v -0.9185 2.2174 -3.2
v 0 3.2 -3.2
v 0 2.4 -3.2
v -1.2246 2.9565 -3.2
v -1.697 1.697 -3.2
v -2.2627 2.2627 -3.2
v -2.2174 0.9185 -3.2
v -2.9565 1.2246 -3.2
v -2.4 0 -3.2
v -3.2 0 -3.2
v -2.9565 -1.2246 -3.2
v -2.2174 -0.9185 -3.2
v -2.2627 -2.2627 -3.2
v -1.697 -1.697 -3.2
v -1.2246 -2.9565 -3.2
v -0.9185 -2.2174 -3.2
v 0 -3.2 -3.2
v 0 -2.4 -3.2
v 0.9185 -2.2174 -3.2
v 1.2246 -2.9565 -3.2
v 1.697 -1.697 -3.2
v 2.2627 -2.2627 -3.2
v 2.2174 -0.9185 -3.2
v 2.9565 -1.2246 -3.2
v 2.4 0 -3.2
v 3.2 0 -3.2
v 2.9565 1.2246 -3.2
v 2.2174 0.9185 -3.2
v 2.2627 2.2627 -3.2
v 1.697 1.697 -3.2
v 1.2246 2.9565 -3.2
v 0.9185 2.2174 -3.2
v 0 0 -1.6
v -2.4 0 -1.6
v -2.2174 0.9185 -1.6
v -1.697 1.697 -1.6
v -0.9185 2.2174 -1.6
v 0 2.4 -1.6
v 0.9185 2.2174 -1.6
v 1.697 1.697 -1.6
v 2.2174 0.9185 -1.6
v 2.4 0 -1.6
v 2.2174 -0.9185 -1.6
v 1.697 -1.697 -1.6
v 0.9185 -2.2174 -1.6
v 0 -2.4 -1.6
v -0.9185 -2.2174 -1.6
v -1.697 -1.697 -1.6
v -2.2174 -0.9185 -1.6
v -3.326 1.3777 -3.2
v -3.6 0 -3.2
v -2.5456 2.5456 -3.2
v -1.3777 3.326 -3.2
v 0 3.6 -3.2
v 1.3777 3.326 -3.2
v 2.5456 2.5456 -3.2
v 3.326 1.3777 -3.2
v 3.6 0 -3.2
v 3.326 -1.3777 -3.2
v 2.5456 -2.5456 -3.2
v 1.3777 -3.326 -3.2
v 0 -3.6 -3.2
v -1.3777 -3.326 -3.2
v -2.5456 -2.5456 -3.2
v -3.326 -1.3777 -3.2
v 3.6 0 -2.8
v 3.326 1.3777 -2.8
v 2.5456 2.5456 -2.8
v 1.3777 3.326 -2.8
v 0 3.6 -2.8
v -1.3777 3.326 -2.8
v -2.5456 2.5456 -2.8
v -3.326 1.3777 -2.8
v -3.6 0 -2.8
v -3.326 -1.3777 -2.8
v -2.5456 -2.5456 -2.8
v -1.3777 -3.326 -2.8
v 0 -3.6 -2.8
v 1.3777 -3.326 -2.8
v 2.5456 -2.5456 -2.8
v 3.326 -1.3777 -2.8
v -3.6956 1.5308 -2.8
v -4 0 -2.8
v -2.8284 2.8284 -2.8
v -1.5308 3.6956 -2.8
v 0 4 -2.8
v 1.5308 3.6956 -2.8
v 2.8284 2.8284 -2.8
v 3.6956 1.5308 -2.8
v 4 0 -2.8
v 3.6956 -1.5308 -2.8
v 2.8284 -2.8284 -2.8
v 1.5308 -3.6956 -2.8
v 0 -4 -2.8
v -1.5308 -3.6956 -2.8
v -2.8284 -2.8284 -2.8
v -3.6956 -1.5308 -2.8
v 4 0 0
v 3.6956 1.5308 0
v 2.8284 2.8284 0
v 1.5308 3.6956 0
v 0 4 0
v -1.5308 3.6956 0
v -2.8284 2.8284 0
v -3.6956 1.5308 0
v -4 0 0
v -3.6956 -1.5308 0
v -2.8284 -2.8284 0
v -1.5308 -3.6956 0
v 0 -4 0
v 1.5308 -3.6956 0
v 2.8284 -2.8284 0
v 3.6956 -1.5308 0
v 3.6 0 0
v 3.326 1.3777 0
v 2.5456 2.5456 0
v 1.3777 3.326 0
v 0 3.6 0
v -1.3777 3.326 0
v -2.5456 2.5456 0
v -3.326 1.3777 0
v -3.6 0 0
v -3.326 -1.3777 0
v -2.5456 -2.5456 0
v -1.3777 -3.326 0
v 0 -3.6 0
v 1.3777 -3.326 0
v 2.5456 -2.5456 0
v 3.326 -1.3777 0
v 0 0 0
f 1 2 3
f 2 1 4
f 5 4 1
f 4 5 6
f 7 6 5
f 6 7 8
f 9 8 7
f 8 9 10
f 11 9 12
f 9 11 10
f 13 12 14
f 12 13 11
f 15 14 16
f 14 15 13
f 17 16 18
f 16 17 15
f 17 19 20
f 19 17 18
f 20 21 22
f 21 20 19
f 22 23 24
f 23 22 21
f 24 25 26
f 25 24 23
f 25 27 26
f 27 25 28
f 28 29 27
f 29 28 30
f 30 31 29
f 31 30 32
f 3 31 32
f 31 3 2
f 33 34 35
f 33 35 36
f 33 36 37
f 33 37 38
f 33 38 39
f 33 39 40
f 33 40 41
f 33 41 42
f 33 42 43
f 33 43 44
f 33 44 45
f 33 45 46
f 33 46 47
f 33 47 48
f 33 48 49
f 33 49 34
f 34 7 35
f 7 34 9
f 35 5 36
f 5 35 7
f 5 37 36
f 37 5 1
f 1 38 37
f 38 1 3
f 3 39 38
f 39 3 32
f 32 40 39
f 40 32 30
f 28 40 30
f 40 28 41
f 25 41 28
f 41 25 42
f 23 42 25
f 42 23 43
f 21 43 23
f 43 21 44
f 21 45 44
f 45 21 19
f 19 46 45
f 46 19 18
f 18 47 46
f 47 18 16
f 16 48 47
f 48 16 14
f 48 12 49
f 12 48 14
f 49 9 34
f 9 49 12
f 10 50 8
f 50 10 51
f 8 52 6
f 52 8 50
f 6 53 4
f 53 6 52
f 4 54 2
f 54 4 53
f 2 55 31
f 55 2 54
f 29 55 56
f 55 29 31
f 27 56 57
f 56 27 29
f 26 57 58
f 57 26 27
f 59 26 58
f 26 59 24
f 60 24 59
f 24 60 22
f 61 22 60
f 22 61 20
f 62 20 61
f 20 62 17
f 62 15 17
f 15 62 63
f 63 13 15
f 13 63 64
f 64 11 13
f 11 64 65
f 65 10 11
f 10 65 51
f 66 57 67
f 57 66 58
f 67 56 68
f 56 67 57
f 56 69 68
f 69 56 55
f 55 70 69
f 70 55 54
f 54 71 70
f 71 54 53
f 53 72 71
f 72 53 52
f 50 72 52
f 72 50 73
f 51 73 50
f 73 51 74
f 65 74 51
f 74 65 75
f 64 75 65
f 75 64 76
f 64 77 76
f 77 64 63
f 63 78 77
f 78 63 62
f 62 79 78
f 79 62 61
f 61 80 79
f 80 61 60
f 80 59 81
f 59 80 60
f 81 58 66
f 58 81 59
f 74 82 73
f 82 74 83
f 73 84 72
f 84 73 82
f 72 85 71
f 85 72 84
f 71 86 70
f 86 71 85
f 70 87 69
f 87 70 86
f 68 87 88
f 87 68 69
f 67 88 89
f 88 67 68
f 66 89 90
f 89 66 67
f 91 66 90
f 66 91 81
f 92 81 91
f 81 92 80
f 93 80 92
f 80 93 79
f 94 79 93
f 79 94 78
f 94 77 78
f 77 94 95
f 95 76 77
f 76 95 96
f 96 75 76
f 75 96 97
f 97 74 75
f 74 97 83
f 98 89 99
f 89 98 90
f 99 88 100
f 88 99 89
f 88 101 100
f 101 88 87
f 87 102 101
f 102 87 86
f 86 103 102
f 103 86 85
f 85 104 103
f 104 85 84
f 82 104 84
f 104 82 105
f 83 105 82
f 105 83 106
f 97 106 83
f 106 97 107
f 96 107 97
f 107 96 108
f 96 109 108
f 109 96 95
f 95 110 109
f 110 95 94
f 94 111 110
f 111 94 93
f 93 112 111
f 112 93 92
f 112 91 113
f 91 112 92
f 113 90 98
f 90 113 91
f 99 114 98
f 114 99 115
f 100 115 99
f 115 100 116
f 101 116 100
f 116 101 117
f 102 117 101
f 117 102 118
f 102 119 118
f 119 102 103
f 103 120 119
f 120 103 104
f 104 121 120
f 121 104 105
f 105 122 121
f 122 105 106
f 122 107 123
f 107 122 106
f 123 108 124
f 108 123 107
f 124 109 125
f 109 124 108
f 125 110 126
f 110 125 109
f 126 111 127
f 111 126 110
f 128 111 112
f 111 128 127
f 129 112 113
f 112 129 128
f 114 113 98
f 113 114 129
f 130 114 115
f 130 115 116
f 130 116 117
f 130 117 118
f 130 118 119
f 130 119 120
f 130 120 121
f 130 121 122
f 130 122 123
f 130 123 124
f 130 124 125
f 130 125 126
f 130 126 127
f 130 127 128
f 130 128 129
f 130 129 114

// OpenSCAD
// file: ../p/4-4ring3.scad
use <../lib.scad>
function ldraw_lib__4_4ring3() = [
// 0 Ring  3 x 1.0
// 0 Name: 4-4ring3.dat
// 0 Author: James Jessiman
// 0 !LDRAW_ORG Primitive UPDATE 2009-01
// 0 !LICENSE Licensed under CC BY 4.0 : see CAreadme.txt
// 
// 0 BFC CERTIFY CCW
  [0,"BFC","CERTIFY"],
  [0,"BFC","CCW"],
// 
// 0 !HISTORY 1998-12-15 [PTadmin] Official Update 1998-10
// 0 !HISTORY 2002-04-05 [hafhead] Added BFC statement
// 0 !HISTORY 2002-04-25 [PTadmin] Official Update 2002-02
// 0 !HISTORY 2007-06-24 [PTadmin] Header formatted for Contributor Agreement
// 0 !HISTORY 2008-07-01 [PTadmin] Official Update 2008-01
// 0 !HISTORY 2008-08-26 [cwdee] Switch polygon winding and rename
// 0 !HISTORY 2009-05-02 [PTadmin] Official Update 2009-01
// 
// 
// 4 16 -1.5308 0 3.6956 -1.1481 0 2.7717 0 0 3 0 0 4
  [4,16,-1.5308,0,3.6956,-1.1481,0,2.7717,0,0,3,0,0,4],
// 4 16 -2.8284 0 2.8284 -2.1213 0 2.1213 -1.1481 0 2.7717 -1.5308 0 3.6956
  [4,16,-2.8284,0,2.8284,-2.1213,0,2.1213,-1.1481,0,2.7717,-1.5308,0,3.6956],
// 4 16 -3.6956 0 1.5308 -2.7717 0 1.1481 -2.1213 0 2.1213 -2.8284 0 2.8284
  [4,16,-3.6956,0,1.5308,-2.7717,0,1.1481,-2.1213,0,2.1213,-2.8284,0,2.8284],
// 4 16 -4 0 0 -3 0 0 -2.7717 0 1.1481 -3.6956 0 1.5308
  [4,16,-4,0,0,-3,0,0,-2.7717,0,1.1481,-3.6956,0,1.5308],
// 4 16 -3.6956 0 -1.5308 -2.7717 0 -1.1481 -3 0 0 -4 0 0
  [4,16,-3.6956,0,-1.5308,-2.7717,0,-1.1481,-3,0,0,-4,0,0],
// 4 16 -2.8284 0 -2.8284 -2.1213 0 -2.1213 -2.7717 0 -1.1481 -3.6956 0 -1.5308
  [4,16,-2.8284,0,-2.8284,-2.1213,0,-2.1213,-2.7717,0,-1.1481,-3.6956,0,-1.5308],
// 4 16 -1.5308 0 -3.6956 -1.1481 0 -2.7717 -2.1213 0 -2.1213 -2.8284 0 -2.8284
  [4,16,-1.5308,0,-3.6956,-1.1481,0,-2.7717,-2.1213,0,-2.1213,-2.8284,0,-2.8284],
// 4 16 0 0 -4 0 0 -3 -1.1481 0 -2.7717 -1.5308 0 -3.6956
  [4,16,0,0,-4,0,0,-3,-1.1481,0,-2.7717,-1.5308,0,-3.6956],
// 4 16 1.5308 0 -3.6956 1.1481 0 -2.7717 0 0 -3 0 0 -4
  [4,16,1.5308,0,-3.6956,1.1481,0,-2.7717,0,0,-3,0,0,-4],
// 4 16 2.8284 0 -2.8284 2.1213 0 -2.1213 1.1481 0 -2.7717 1.5308 0 -3.6956
  [4,16,2.8284,0,-2.8284,2.1213,0,-2.1213,1.1481,0,-2.7717,1.5308,0,-3.6956],
// 4 16 3.6956 0 -1.5308 2.7717 0 -1.1481 2.1213 0 -2.1213 2.8284 0 -2.8284
  [4,16,3.6956,0,-1.5308,2.7717,0,-1.1481,2.1213,0,-2.1213,2.8284,0,-2.8284],
// 4 16 4 0 0 3 0 0 2.7717 0 -1.1481 3.6956 0 -1.5308
  [4,16,4,0,0,3,0,0,2.7717,0,-1.1481,3.6956,0,-1.5308],
// 4 16 3.6956 0 1.5308 2.7717 0 1.1481 3 0 0 4 0 0
  [4,16,3.6956,0,1.5308,2.7717,0,1.1481,3,0,0,4,0,0],
// 4 16 2.8284 0 2.8284 2.1213 0 2.1213 2.7717 0 1.1481 3.6956 0 1.5308
  [4,16,2.8284,0,2.8284,2.1213,0,2.1213,2.7717,0,1.1481,3.6956,0,1.5308],
// 4 16 1.5308 0 3.6956 1.1481 0 2.7717 2.1213 0 2.1213 2.8284 0 2.8284
  [4,16,1.5308,0,3.6956,1.1481,0,2.7717,2.1213,0,2.1213,2.8284,0,2.8284],
// 4 16 0 0 4 0 0 3 1.1481 0 2.7717 1.5308 0 3.6956
  [4,16,0,0,4,0,0,3,1.1481,0,2.7717,1.5308,0,3.6956],
// 0
];
module ldraw_lib__4_4ring3(step=0, col=false, unit=2/5, alt=false, line=0.2, solid=!$preview)
    makepoly(ldraw_lib__4_4ring3(), step=step, col=col, unit=unit, alt=alt, line=line, solid=solid);
ldraw_lib__4_4ring3(line=0.2);
// file: ../p/4-4cylc.scad
use <../lib.scad>
use <4-4cyli.scad>
use <4-4disc.scad>
use <4-4edge.scad>
function ldraw_lib__4_4cylc() = [
// 0 Cylinder Closed 1.0
// 0 Name: 4-4cylc.dat
// 0 Author: Alex Taylor [anathema]
// 0 !LDRAW_ORG Primitive UPDATE 2009-02
// 0 !LICENSE Licensed under CC BY 4.0 : see CAreadme.txt
// 
// 0 BFC CERTIFY CCW
  [0,"BFC","CERTIFY"],
  [0,"BFC","CCW"],
// 
// 0 !HISTORY 2008-12-29 [cwdee] Removed one disc
// 0 !HISTORY 2009-09-03 [PTadmin] Official Update 2009-02
// 
// 
// 1 16 0 0 0 1 0 0 0 1 0 0 0 1 4-4edge.dat
  [1,16,0,0,0,1,0,0,0,1,0,0,0,1, ldraw_lib__4_4edge()],
// 1 16 0 1 0 1 0 0 0 1 0 0 0 1 4-4edge.dat
  [1,16,0,1,0,1,0,0,0,1,0,0,0,1, ldraw_lib__4_4edge()],
// 1 16 0 0 0 1 0 0 0 1 0 0 0 1 4-4disc.dat
  [1,16,0,0,0,1,0,0,0,1,0,0,0,1, ldraw_lib__4_4disc()],
// 1 16 0 0 0 1 0 0 0 1 0 0 0 1 4-4cyli.dat
  [1,16,0,0,0,1,0,0,0,1,0,0,0,1, ldraw_lib__4_4cyli()],
// 0
];
module ldraw_lib__4_4cylc(step=0, col=false, unit=2/5, alt=false, line=0.2, solid=!$preview)
    makepoly(ldraw_lib__4_4cylc(), step=step, col=col, unit=unit, alt=alt, line=line, solid=solid);
ldraw_lib__4_4cylc(line=0.2);
// file: ../p/4-4edge.scad
use <../lib.scad>
function ldraw_lib__4_4edge() = [
// 0 Circle 1.0
// 0 Name: 4-4edge.dat
// 0 Author: James Jessiman
// 0 !LDRAW_ORG Primitive UPDATE 2017-01
// 0 !LICENSE Licensed under CC BY 4.0 : see CAreadme.txt
// 
// 0 BFC CERTIFY CCW
  [0,"BFC","CERTIFY"],
  [0,"BFC","CCW"],
// 
// 0 !HISTORY 1998-12-15 [PTadmin] Official Update 1998-10
// 0 !HISTORY 2005-12-28 [PTadmin] Official Update 2005-01
// 0 !HISTORY 2007-06-24 [PTadmin] Header formatted for Contributor Agreement
// 0 !HISTORY 2008-07-01 [PTadmin] Official Update 2008-01
// 0 !HISTORY 2017-01-15 [Steffen] BFCed
// 0 !HISTORY 2017-12-30 [PTadmin] Official Update 2017-01
// 
// 
// 2 24 1 0 0 0.9239 0 0.3827
  [2,24,1,0,0,0.9239,0,0.3827],
// 2 24 0.9239 0 0.3827 0.7071 0 0.7071
  [2,24,0.9239,0,0.3827,0.7071,0,0.7071],
// 2 24 0.7071 0 0.7071 0.3827 0 0.9239
  [2,24,0.7071,0,0.7071,0.3827,0,0.9239],
// 2 24 0.3827 0 0.9239 0 0 1
  [2,24,0.3827,0,0.9239,0,0,1],
// 2 24 0 0 1 -0.3827 0 0.9239
  [2,24,0,0,1,-0.3827,0,0.9239],
// 2 24 -0.3827 0 0.9239 -0.7071 0 0.7071
  [2,24,-0.3827,0,0.9239,-0.7071,0,0.7071],
// 2 24 -0.7071 0 0.7071 -0.9239 0 0.3827
  [2,24,-0.7071,0,0.7071,-0.9239,0,0.3827],
// 2 24 -0.9239 0 0.3827 -1 0 -0
  [2,24,-0.9239,0,0.3827,-1,0,-0],
// 2 24 -1 0 -0 -0.9239 0 -0.3827
  [2,24,-1,0,-0,-0.9239,0,-0.3827],
// 2 24 -0.9239 0 -0.3827 -0.7071 0 -0.7071
  [2,24,-0.9239,0,-0.3827,-0.7071,0,-0.7071],
// 2 24 -0.7071 0 -0.7071 -0.3827 0 -0.9239
  [2,24,-0.7071,0,-0.7071,-0.3827,0,-0.9239],
// 2 24 -0.3827 0 -0.9239 0 0 -1
  [2,24,-0.3827,0,-0.9239,0,0,-1],
// 2 24 0 0 -1 0.3827 0 -0.9239
  [2,24,0,0,-1,0.3827,0,-0.9239],
// 2 24 0.3827 0 -0.9239 0.7071 0 -0.7071
  [2,24,0.3827,0,-0.9239,0.7071,0,-0.7071],
// 2 24 0.7071 0 -0.7071 0.9239 0 -0.3827
  [2,24,0.7071,0,-0.7071,0.9239,0,-0.3827],
// 2 24 0.9239 0 -0.3827 1 0 0
  [2,24,0.9239,0,-0.3827,1,0,0],
];
module ldraw_lib__4_4edge(step=0, col=false, unit=2/5, alt=false, line=0.2, solid=!$preview)
    makepoly(ldraw_lib__4_4edge(), step=step, col=col, unit=unit, alt=alt, line=line, solid=solid);
ldraw_lib__4_4edge(line=0.2);
// file: ../p/4-4cyli.scad
use <../lib.scad>
function ldraw_lib__4_4cyli() = [
// 0 Cylinder 1.0
// 0 Name: 4-4cyli.dat
// 0 Author: James Jessiman
// 0 !LDRAW_ORG Primitive UPDATE 2005-01
// 0 !LICENSE Licensed under CC BY 4.0 : see CAreadme.txt
// 
// 0 BFC CERTIFY CCW
  [0,"BFC","CERTIFY"],
  [0,"BFC","CCW"],
// 
// 0 !HISTORY 1998-12-15 [PTadmin] Official Update 1998-10
// 0 !HISTORY 2002-03-23 [sbliss] Added BFC statement; merged headers from files in distributions LDraw 0.27 and Complete.
// 0 !HISTORY 2002-04-25 [PTadmin] Official Update 2002-02
// 0 !HISTORY 2004-12-14 [guyvivan] BFC CCW
// 0 !HISTORY 2005-12-28 [PTadmin] Official Update 2005-01
// 0 !HISTORY 2007-06-24 [PTadmin] Header formatted for Contributor Agreement
// 0 !HISTORY 2008-07-01 [PTadmin] Official Update 2008-01
// 
// 
// 4 16 1 1 0 0.9239 1 0.3827 0.9239 0 0.3827 1 0 0
  [4,16,1,1,0,0.9239,1,0.3827,0.9239,0,0.3827,1,0,0],
// 5 24 1 0 0 1 1 0 0.9239 0 0.3827 0.9239 0 -0.3827
  [5,24,1,0,0,1,1,0,0.9239,0,0.3827,0.9239,0,-0.3827],
// 4 16 0.9239 1 0.3827 0.7071 1 0.7071 0.7071 0 0.7071 0.9239 0 0.3827
  [4,16,0.9239,1,0.3827,0.7071,1,0.7071,0.7071,0,0.7071,0.9239,0,0.3827],
// 5 24 0.9239 0 0.3827 0.9239 1 0.3827 0.7071 0 0.7071 1 0 0
  [5,24,0.9239,0,0.3827,0.9239,1,0.3827,0.7071,0,0.7071,1,0,0],
// 4 16 0.7071 1 0.7071 0.3827 1 0.9239 0.3827 0 0.9239 0.7071 0 0.7071
  [4,16,0.7071,1,0.7071,0.3827,1,0.9239,0.3827,0,0.9239,0.7071,0,0.7071],
// 5 24 0.7071 0 0.7071 0.7071 1 0.7071 0.3827 0 0.9239 0.9239 0 0.3827
  [5,24,0.7071,0,0.7071,0.7071,1,0.7071,0.3827,0,0.9239,0.9239,0,0.3827],
// 4 16 0.3827 1 0.9239 0 1 1 0 0 1 0.3827 0 0.9239
  [4,16,0.3827,1,0.9239,0,1,1,0,0,1,0.3827,0,0.9239],
// 5 24 0.3827 0 0.9239 0.3827 1 0.9239 0 0 1 0.7071 0 0.7071
  [5,24,0.3827,0,0.9239,0.3827,1,0.9239,0,0,1,0.7071,0,0.7071],
// 4 16 0 1 1 -0.3827 1 0.9239 -0.3827 0 0.9239 0 0 1
  [4,16,0,1,1,-0.3827,1,0.9239,-0.3827,0,0.9239,0,0,1],
// 5 24 0 0 1 0 1 1 -0.3827 0 0.9239 0.3827 0 0.9239
  [5,24,0,0,1,0,1,1,-0.3827,0,0.9239,0.3827,0,0.9239],
// 4 16 -0.3827 1 0.9239 -0.7071 1 0.7071 -0.7071 0 0.7071 -0.3827 0 0.9239
  [4,16,-0.3827,1,0.9239,-0.7071,1,0.7071,-0.7071,0,0.7071,-0.3827,0,0.9239],
// 5 24 -0.3827 0 0.9239 -0.3827 1 0.9239 -0.7071 0 0.7071 0 0 1
  [5,24,-0.3827,0,0.9239,-0.3827,1,0.9239,-0.7071,0,0.7071,0,0,1],
// 4 16 -0.7071 1 0.7071 -0.9239 1 0.3827 -0.9239 0 0.3827 -0.7071 0 0.7071
  [4,16,-0.7071,1,0.7071,-0.9239,1,0.3827,-0.9239,0,0.3827,-0.7071,0,0.7071],
// 5 24 -0.7071 0 0.7071 -0.7071 1 0.7071 -0.9239 0 0.3827 -0.3827 0 0.9239
  [5,24,-0.7071,0,0.7071,-0.7071,1,0.7071,-0.9239,0,0.3827,-0.3827,0,0.9239],
// 4 16 -0.9239 1 0.3827 -1 1 0 -1 0 0 -0.9239 0 0.3827
  [4,16,-0.9239,1,0.3827,-1,1,0,-1,0,0,-0.9239,0,0.3827],
// 5 24 -0.9239 0 0.3827 -0.9239 1 0.3827 -1 0 0 -0.7071 0 0.7071
  [5,24,-0.9239,0,0.3827,-0.9239,1,0.3827,-1,0,0,-0.7071,0,0.7071],
// 4 16 -1 1 0 -0.9239 1 -0.3827 -0.9239 0 -0.3827 -1 0 0
  [4,16,-1,1,0,-0.9239,1,-0.3827,-0.9239,0,-0.3827,-1,0,0],
// 5 24 -1 0 0 -1 1 0 -0.9239 0 -0.3827 -0.9239 0 0.3827
  [5,24,-1,0,0,-1,1,0,-0.9239,0,-0.3827,-0.9239,0,0.3827],
// 4 16 -0.9239 1 -0.3827 -0.7071 1 -0.7071 -0.7071 0 -0.7071 -0.9239 0 -0.3827
  [4,16,-0.9239,1,-0.3827,-0.7071,1,-0.7071,-0.7071,0,-0.7071,-0.9239,0,-0.3827],
// 5 24 -0.9239 0 -0.3827 -0.9239 1 -0.3827 -0.7071 0 -0.7071 -1 0 0
  [5,24,-0.9239,0,-0.3827,-0.9239,1,-0.3827,-0.7071,0,-0.7071,-1,0,0],
// 4 16 -0.7071 1 -0.7071 -0.3827 1 -0.9239 -0.3827 0 -0.9239 -0.7071 0 -0.7071
  [4,16,-0.7071,1,-0.7071,-0.3827,1,-0.9239,-0.3827,0,-0.9239,-0.7071,0,-0.7071],
// 5 24 -0.7071 0 -0.7071 -0.7071 1 -0.7071 -0.3827 0 -0.9239 -0.9239 0 -0.3827
  [5,24,-0.7071,0,-0.7071,-0.7071,1,-0.7071,-0.3827,0,-0.9239,-0.9239,0,-0.3827],
// 4 16 -0.3827 1 -0.9239 0 1 -1 0 0 -1 -0.3827 0 -0.9239
  [4,16,-0.3827,1,-0.9239,0,1,-1,0,0,-1,-0.3827,0,-0.9239],
// 5 24 -0.3827 0 -0.9239 -0.3827 1 -0.9239 0 0 -1 -0.7071 0 -0.7071
  [5,24,-0.3827,0,-0.9239,-0.3827,1,-0.9239,0,0,-1,-0.7071,0,-0.7071],
// 4 16 0 1 -1 0.3827 1 -0.9239 0.3827 0 -0.9239 0 0 -1
  [4,16,0,1,-1,0.3827,1,-0.9239,0.3827,0,-0.9239,0,0,-1],
// 5 24 0 0 -1 0 1 -1 0.3827 0 -0.9239 -0.3827 0 -0.9239
  [5,24,0,0,-1,0,1,-1,0.3827,0,-0.9239,-0.3827,0,-0.9239],
// 4 16 0.3827 1 -0.9239 0.7071 1 -0.7071 0.7071 0 -0.7071 0.3827 0 -0.9239
  [4,16,0.3827,1,-0.9239,0.7071,1,-0.7071,0.7071,0,-0.7071,0.3827,0,-0.9239],
// 5 24 0.3827 0 -0.9239 0.3827 1 -0.9239 0.7071 0 -0.7071 0 0 -1
  [5,24,0.3827,0,-0.9239,0.3827,1,-0.9239,0.7071,0,-0.7071,0,0,-1],
// 4 16 0.7071 1 -0.7071 0.9239 1 -0.3827 0.9239 0 -0.3827 0.7071 0 -0.7071
  [4,16,0.7071,1,-0.7071,0.9239,1,-0.3827,0.9239,0,-0.3827,0.7071,0,-0.7071],
// 5 24 0.7071 0 -0.7071 0.7071 1 -0.7071 0.9239 0 -0.3827 0.3827 0 -0.9239
  [5,24,0.7071,0,-0.7071,0.7071,1,-0.7071,0.9239,0,-0.3827,0.3827,0,-0.9239],
// 4 16 0.9239 1 -0.3827 1 1 0 1 0 0 0.9239 0 -0.3827
  [4,16,0.9239,1,-0.3827,1,1,0,1,0,0,0.9239,0,-0.3827],
// 5 24 0.9239 0 -0.3827 0.9239 1 -0.3827 1 0 0 0.7071 0 -0.7071
  [5,24,0.9239,0,-0.3827,0.9239,1,-0.3827,1,0,0,0.7071,0,-0.7071],
// 0
];
module ldraw_lib__4_4cyli(step=0, col=false, unit=2/5, alt=false, line=0.2, solid=!$preview)
    makepoly(ldraw_lib__4_4cyli(), step=step, col=col, unit=unit, alt=alt, line=line, solid=solid);
ldraw_lib__4_4cyli(line=0.2);
// file: ../p/stud4o.scad
use <../lib.scad>
use <4-4cylc.scad>
use <4-4ring3.scad>
function ldraw_lib__stud4o() = [
// 0 Stud Tube Open without Outer Cylinder
// 0 Name: stud4o.dat
// 0 Author: Magnus Forsberg [MagFors]
// 0 !LDRAW_ORG Primitive UPDATE 2011-02
// 0 !LICENSE Licensed under CC BY 4.0 : see CAreadme.txt
// 
// 0 !HELP This stud is a "antistud" to be used like a underside stud,
// 0 !HELP but without the outer cylinder.
// 0 !HELP 1 47 0 0 0 1 0 0 0 1 0 0 0 1 stud4.dat
// 
// 0 BFC CERTIFY CCW
  [0,"BFC","CERTIFY"],
  [0,"BFC","CCW"],
// 
// 0 !HISTORY 2011-12-29 [PTadmin] Official Update 2011-02
// 
// 
// 1 16 0 -4 0 2 0 0 0 1 0 0 0 2 4-4ring3.dat
  [1,16,0,-4,0,2,0,0,0,1,0,0,0,2, ldraw_lib__4_4ring3()],
// 0 BFC INVERTNEXT
  [0,"BFC","INVERTNEXT"],
// 1 16 0 0 0 -6 0 0 0 -4 0 0 0 6 4-4cylc.dat
  [1,16,0,0,0,-6,0,0,0,-4,0,0,0,6, ldraw_lib__4_4cylc()],
];
module ldraw_lib__stud4o(step=0, col=false, unit=2/5, alt=false, line=0.2, solid=!$preview)
    makepoly(ldraw_lib__stud4o(), step=step, col=col, unit=unit, alt=alt, line=line, solid=solid);
ldraw_lib__stud4o(line=0.2);
// file: ../p/4-4ring8.scad
use <../lib.scad>
function ldraw_lib__4_4ring8() = [
// 0 Ring  8 x 1.0
// 0 Name: 4-4ring8.dat
// 0 Author: Steffen [Steffen]
// 0 !LDRAW_ORG Primitive UPDATE 2012-01
// 0 !LICENSE Licensed under CC BY 4.0 : see CAreadme.txt
// 
// 0 BFC CERTIFY CCW
  [0,"BFC","CERTIFY"],
  [0,"BFC","CCW"],
// 
// 0 !HISTORY 2003-12-19 [PTadmin] Official Update 2003-03
// 0 !HISTORY 2007-06-24 [PTadmin] Header formatted for Contributor Agreement
// 0 !HISTORY 2008-07-01 [PTadmin] Official Update 2008-01
// 0 !HISTORY 2012-02-16 [Philo] Changed to CCW
// 0 !HISTORY 2012-03-30 [PTadmin] Official Update 2012-01
// 
// 
// 4 16 9 0 0 8.3151 0 3.4443 7.3912 0 3.0616 8 0 0
  [4,16,9,0,0,8.3151,0,3.4443,7.3912,0,3.0616,8,0,0],
// 4 16 8.3151 0 3.4443 6.3639 0 6.3639 5.6568 0 5.6568 7.3912 0 3.0616
  [4,16,8.3151,0,3.4443,6.3639,0,6.3639,5.6568,0,5.6568,7.3912,0,3.0616],
// 4 16 6.3639 0 6.3639 3.4443 0 8.3151 3.0616 0 7.3912 5.6568 0 5.6568
  [4,16,6.3639,0,6.3639,3.4443,0,8.3151,3.0616,0,7.3912,5.6568,0,5.6568],
// 4 16 3.4443 0 8.3151 0 0 9 0 0 8 3.0616 0 7.3912
  [4,16,3.4443,0,8.3151,0,0,9,0,0,8,3.0616,0,7.3912],
// 4 16 0 0 9 -3.4443 0 8.3151 -3.0616 0 7.3912 0 0 8
  [4,16,0,0,9,-3.4443,0,8.3151,-3.0616,0,7.3912,0,0,8],
// 4 16 -3.4443 0 8.3151 -6.3639 0 6.3639 -5.6568 0 5.6568 -3.0616 0 7.3912
  [4,16,-3.4443,0,8.3151,-6.3639,0,6.3639,-5.6568,0,5.6568,-3.0616,0,7.3912],
// 4 16 -6.3639 0 6.3639 -8.3151 0 3.4443 -7.3912 0 3.0616 -5.6568 0 5.6568
  [4,16,-6.3639,0,6.3639,-8.3151,0,3.4443,-7.3912,0,3.0616,-5.6568,0,5.6568],
// 4 16 -8.3151 0 3.4443 -9 0 0 -8 0 0 -7.3912 0 3.0616
  [4,16,-8.3151,0,3.4443,-9,0,0,-8,0,0,-7.3912,0,3.0616],
// 4 16 -9 0 0 -8.3151 0 -3.4443 -7.3912 0 -3.0616 -8 0 0
  [4,16,-9,0,0,-8.3151,0,-3.4443,-7.3912,0,-3.0616,-8,0,0],
// 4 16 -8.3151 0 -3.4443 -6.3639 0 -6.3639 -5.6568 0 -5.6568 -7.3912 0 -3.0616
  [4,16,-8.3151,0,-3.4443,-6.3639,0,-6.3639,-5.6568,0,-5.6568,-7.3912,0,-3.0616],
// 4 16 -6.3639 0 -6.3639 -3.4443 0 -8.3151 -3.0616 0 -7.3912 -5.6568 0 -5.6568
  [4,16,-6.3639,0,-6.3639,-3.4443,0,-8.3151,-3.0616,0,-7.3912,-5.6568,0,-5.6568],
// 4 16 -3.4443 0 -8.3151 0 0 -9 0 0 -8 -3.0616 0 -7.3912
  [4,16,-3.4443,0,-8.3151,0,0,-9,0,0,-8,-3.0616,0,-7.3912],
// 4 16 0 0 -9 3.4443 0 -8.3151 3.0616 0 -7.3912 0 0 -8
  [4,16,0,0,-9,3.4443,0,-8.3151,3.0616,0,-7.3912,0,0,-8],
// 4 16 3.4443 0 -8.3151 6.3639 0 -6.3639 5.6568 0 -5.6568 3.0616 0 -7.3912
  [4,16,3.4443,0,-8.3151,6.3639,0,-6.3639,5.6568,0,-5.6568,3.0616,0,-7.3912],
// 4 16 6.3639 0 -6.3639 8.3151 0 -3.4443 7.3912 0 -3.0616 5.6568 0 -5.6568
  [4,16,6.3639,0,-6.3639,8.3151,0,-3.4443,7.3912,0,-3.0616,5.6568,0,-5.6568],
// 4 16 8.3151 0 -3.4443 9 0 0 8 0 0 7.3912 0 -3.0616
  [4,16,8.3151,0,-3.4443,9,0,0,8,0,0,7.3912,0,-3.0616],
];
module ldraw_lib__4_4ring8(step=0, col=false, unit=2/5, alt=false, line=0.2, solid=!$preview)
    makepoly(ldraw_lib__4_4ring8(), step=step, col=col, unit=unit, alt=alt, line=line, solid=solid);
ldraw_lib__4_4ring8(line=0.2);
// file: ../p/4-4cylo.scad
use <../lib.scad>
use <4-4cyli.scad>
use <4-4edge.scad>
function ldraw_lib__4_4cylo() = [
// 0 Cylinder Open 1.0
// 0 Name: 4-4cylo.dat
// 0 Author: Mark Kennedy [mkennedy]
// 0 !LDRAW_ORG Primitive UPDATE 2010-01
// 0 !LICENSE Licensed under CC BY 4.0 : see CAreadme.txt
// 
// 0 BFC CERTIFY CCW
  [0,"BFC","CERTIFY"],
  [0,"BFC","CCW"],
// 
// 0 !HISTORY 2010-04-05 [PTadmin] Official Update 2010-01
// 
// 
// 1 16 0 0 0 1 0 0 0 1 0 0 0 1 4-4edge.dat
  [1,16,0,0,0,1,0,0,0,1,0,0,0,1, ldraw_lib__4_4edge()],
// 1 16 0 1 0 1 0 0 0 1 0 0 0 1 4-4edge.dat
  [1,16,0,1,0,1,0,0,0,1,0,0,0,1, ldraw_lib__4_4edge()],
// 1 16 0 0 0 1 0 0 0 1 0 0 0 1 4-4cyli.dat
  [1,16,0,0,0,1,0,0,0,1,0,0,0,1, ldraw_lib__4_4cyli()],
// 0
];
module ldraw_lib__4_4cylo(step=0, col=false, unit=2/5, alt=false, line=0.2, solid=!$preview)
    makepoly(ldraw_lib__4_4cylo(), step=step, col=col, unit=unit, alt=alt, line=line, solid=solid);
ldraw_lib__4_4cylo(line=0.2);
// file: s/98138s02.scad
use <../../lib.scad>
use <../../p/4-4cylo.scad>
use <../../p/4-4ring8.scad>
use <../../p/4-4ring9.scad>
use <../../p/stud4o.scad>
function ldraw_lib__s__98138s02() = [
// 0 ~Tile  1 x  1 Round with Groove without Complete Top Face
// 0 Name: s\98138s02.dat
// 0 Author: Magnus Forsberg [MagFors]
// 0 !LDRAW_ORG Subpart UPDATE 2020-01
// 0 !LICENSE Licensed under CC BY 4.0 : see CAreadme.txt
// 
// 0 BFC CERTIFY CCW
  [0,"BFC","CERTIFY"],
  [0,"BFC","CCW"],
// 
// 0 !HISTORY 2020-06-28 [PTadmin] Official Update 2020-01
// 
// 
// 1 16 0 4 0 1 0 0 0 -1 0 0 0 1 stud4o.dat
  [1,16,0,4,0,1,0,0,0,-1,0,0,0,1, ldraw_lib__stud4o()],
// 1 16 0 8 0 -1 0 0 0 -1 0 0 0 1 4-4ring8.dat
  [1,16,0,8,0,-1,0,0,0,-1,0,0,0,1, ldraw_lib__4_4ring8()],
// 1 16 0 7 0 9 0 0 0 1 0 0 0 9 4-4cylo.dat
  [1,16,0,7,0,9,0,0,0,1,0,0,0,9, ldraw_lib__4_4cylo()],
// 1 16 0 7 0 -1 0 0 0 -1 0 0 0 1 4-4ring9.dat
  [1,16,0,7,0,-1,0,0,0,-1,0,0,0,1, ldraw_lib__4_4ring9()],
// 1 16 0 0 0 10 0 0 0 7 0 0 0 10 4-4cylo.dat
  [1,16,0,0,0,10,0,0,0,7,0,0,0,10, ldraw_lib__4_4cylo()],
];
module ldraw_lib__s__98138s02(step=0, col=false, unit=2/5, alt=false, line=0.2, solid=!$preview)
    makepoly(ldraw_lib__s__98138s02(), step=step, col=col, unit=unit, alt=alt, line=line, solid=solid);
ldraw_lib__s__98138s02(line=0.2);
// file: ../p/4-4ring9.scad
use <../lib.scad>
function ldraw_lib__4_4ring9() = [
// 0 Ring  9 x 1.0
// 0 Name: 4-4ring9.dat
// 0 Author: Magnus Forsberg [MagFors]
// 0 !LDRAW_ORG Primitive UPDATE 2024-01
// 0 !LICENSE Licensed under CC BY 4.0 : see CAreadme.txt
// 
// 0 BFC CERTIFY CCW
  [0,"BFC","CERTIFY"],
  [0,"BFC","CCW"],
// 
// 0 !HISTORY 2004-04-22 [PTadmin] Official Update 2004-02
// 0 !HISTORY 2007-06-24 [PTadmin] Header formatted for Contributor Agreement
// 0 !HISTORY 2008-07-01 [PTadmin] Official Update 2008-01
// 0 !HISTORY 2024-01-04 [MagFors] Complete regeneration, original by jriley
// 0 !HISTORY 2024-01-29 [OrionP] Official Update 2024-01
// 
// 4 16 10 0 0 9.239 0 3.827 8.3151 0 3.4443 9 0 0
  [4,16,10,0,0,9.239,0,3.827,8.3151,0,3.4443,9,0,0],
// 4 16 9.239 0 3.827 7.071 0 7.071 6.3639 0 6.3639 8.3151 0 3.4443
  [4,16,9.239,0,3.827,7.071,0,7.071,6.3639,0,6.3639,8.3151,0,3.4443],
// 4 16 7.071 0 7.071 3.827 0 9.239 3.4443 0 8.3151 6.3639 0 6.3639
  [4,16,7.071,0,7.071,3.827,0,9.239,3.4443,0,8.3151,6.3639,0,6.3639],
// 4 16 3.827 0 9.239 0 0 10 0 0 9 3.4443 0 8.3151
  [4,16,3.827,0,9.239,0,0,10,0,0,9,3.4443,0,8.3151],
// 4 16 0 0 10 -3.827 0 9.239 -3.4443 0 8.3151 0 0 9
  [4,16,0,0,10,-3.827,0,9.239,-3.4443,0,8.3151,0,0,9],
// 4 16 -3.827 0 9.239 -7.071 0 7.071 -6.3639 0 6.3639 -3.4443 0 8.3151
  [4,16,-3.827,0,9.239,-7.071,0,7.071,-6.3639,0,6.3639,-3.4443,0,8.3151],
// 4 16 -7.071 0 7.071 -9.239 0 3.827 -8.3151 0 3.4443 -6.3639 0 6.3639
  [4,16,-7.071,0,7.071,-9.239,0,3.827,-8.3151,0,3.4443,-6.3639,0,6.3639],
// 4 16 -9.239 0 3.827 -10 0 0 -9 0 0 -8.3151 0 3.4443
  [4,16,-9.239,0,3.827,-10,0,0,-9,0,0,-8.3151,0,3.4443],
// 4 16 -10 0 0 -9.239 0 -3.827 -8.3151 0 -3.4443 -9 0 0
  [4,16,-10,0,0,-9.239,0,-3.827,-8.3151,0,-3.4443,-9,0,0],
// 4 16 -9.239 0 -3.827 -7.071 0 -7.071 -6.3639 0 -6.3639 -8.3151 0 -3.4443
  [4,16,-9.239,0,-3.827,-7.071,0,-7.071,-6.3639,0,-6.3639,-8.3151,0,-3.4443],
// 4 16 -7.071 0 -7.071 -3.827 0 -9.239 -3.4443 0 -8.3151 -6.3639 0 -6.3639
  [4,16,-7.071,0,-7.071,-3.827,0,-9.239,-3.4443,0,-8.3151,-6.3639,0,-6.3639],
// 4 16 -3.827 0 -9.239 0 0 -10 0 0 -9 -3.4443 0 -8.3151
  [4,16,-3.827,0,-9.239,0,0,-10,0,0,-9,-3.4443,0,-8.3151],
// 4 16 0 0 -10 3.827 0 -9.239 3.4443 0 -8.3151 0 0 -9
  [4,16,0,0,-10,3.827,0,-9.239,3.4443,0,-8.3151,0,0,-9],
// 4 16 3.827 0 -9.239 7.071 0 -7.071 6.3639 0 -6.3639 3.4443 0 -8.3151
  [4,16,3.827,0,-9.239,7.071,0,-7.071,6.3639,0,-6.3639,3.4443,0,-8.3151],
// 4 16 7.071 0 -7.071 9.239 0 -3.827 8.3151 0 -3.4443 6.3639 0 -6.3639
  [4,16,7.071,0,-7.071,9.239,0,-3.827,8.3151,0,-3.4443,6.3639,0,-6.3639],
// 4 16 9.239 0 -3.827 10 0 0 9 0 0 8.3151 0 -3.4443
  [4,16,9.239,0,-3.827,10,0,0,9,0,0,8.3151,0,-3.4443],
// 0 // Build by LDPartEditor (PrimGen 2.X)
];
module ldraw_lib__4_4ring9(step=0, col=false, unit=2/5, alt=false, line=0.2, solid=!$preview)
    makepoly(ldraw_lib__4_4ring9(), step=step, col=col, unit=unit, alt=alt, line=line, solid=solid);
ldraw_lib__4_4ring9(line=0.2);
// file: s/98138s01.scad
use <../../lib.scad>
use <../../p/4-4ring9.scad>
use <98138s02.scad>
function ldraw_lib__s__98138s01() = [
// 0 ~Tile  1 x  1 Round with Groove with Partial Top Face
// 0 Name: s\98138s01.dat
// 0 Author: Magnus Forsberg [MagFors]
// 0 !LDRAW_ORG Subpart UPDATE 2020-01
// 0 !LICENSE Licensed under CC BY 4.0 : see CAreadme.txt
// 
// 0 BFC CERTIFY CCW
  [0,"BFC","CERTIFY"],
  [0,"BFC","CCW"],
// 
// 0 !HISTORY 2011-12-29 [PTadmin] Official Update 2011-02
// 0 !HISTORY 2016-06-17 [MagFors] Reduced the rounded edge to 0.5 ldu
// 0 !HISTORY 2016-12-31 [PTadmin] Official Update 2016-01
// 0 !HISTORY 2019-06-17 [MagFors] Removed the rounded edge
// 0 !HISTORY 2019-07-19 [MagFors] Subfiled without top surface
// 0 !HISTORY 2020-06-28 [PTadmin] Official Update 2020-01
// 
// 
// 1 16 0 0 0 1 0 0 0 1 0 0 0 1 s\98138s02.dat
  [1,16,0,0,0,1,0,0,0,1,0,0,0,1, ldraw_lib__s__98138s02()],
// 1 16 0 0 0 1 0 0 0 1 0 0 0 1 4-4ring9.dat
  [1,16,0,0,0,1,0,0,0,1,0,0,0,1, ldraw_lib__4_4ring9()],
];
module ldraw_lib__s__98138s01(step=0, col=false, unit=2/5, alt=false, line=0.2, solid=!$preview)
    makepoly(ldraw_lib__s__98138s01(), step=step, col=col, unit=unit, alt=alt, line=line, solid=solid);
ldraw_lib__s__98138s01(line=0.2);
// file: ../p/4-4disc.scad
use <../lib.scad>
function ldraw_lib__4_4disc() = [
// 0 Disc 1.0
// 0 Name: 4-4disc.dat
// 0 Author: James Jessiman
// 0 !LDRAW_ORG Primitive UPDATE 2002-02
// 0 !LICENSE Licensed under CC BY 4.0 : see CAreadme.txt
// 
// 0 BFC CERTIFY CCW
  [0,"BFC","CERTIFY"],
  [0,"BFC","CCW"],
// 
// 0 !HISTORY 1998-12-15 [PTadmin] Official Update 1998-10
// 0 !HISTORY 2002-03-23 [sbliss] Added BFC statement
// 0 !HISTORY 2002-04-25 [PTadmin] Official Update 2002-02
// 0 !HISTORY 2007-06-24 [PTadmin] Header formatted for Contributor Agreement
// 0 !HISTORY 2008-07-01 [PTadmin] Official Update 2008-01
// 
// 
// 3 16 0 0 0 1 0 0 0.9239 0 0.3827
  [3,16,0,0,0,1,0,0,0.9239,0,0.3827],
// 3 16 0 0 0 0.9239 0 0.3827 0.7071 0 0.7071
  [3,16,0,0,0,0.9239,0,0.3827,0.7071,0,0.7071],
// 3 16 0 0 0 0.7071 0 0.7071 0.3827 0 0.9239
  [3,16,0,0,0,0.7071,0,0.7071,0.3827,0,0.9239],
// 3 16 0 0 0 0.3827 0 0.9239 0 0 1
  [3,16,0,0,0,0.3827,0,0.9239,0,0,1],
// 3 16 0 0 0 0 0 1 -0.3827 0 0.9239
  [3,16,0,0,0,0,0,1,-0.3827,0,0.9239],
// 3 16 0 0 0 -0.3827 0 0.9239 -0.7071 0 0.7071
  [3,16,0,0,0,-0.3827,0,0.9239,-0.7071,0,0.7071],
// 3 16 0 0 0 -0.7071 0 0.7071 -0.9239 0 0.3827
  [3,16,0,0,0,-0.7071,0,0.7071,-0.9239,0,0.3827],
// 3 16 0 0 0 -0.9239 0 0.3827 -1 0 -0
  [3,16,0,0,0,-0.9239,0,0.3827,-1,0,-0],
// 3 16 0 0 0 -1 0 -0 -0.9239 0 -0.3827
  [3,16,0,0,0,-1,0,-0,-0.9239,0,-0.3827],
// 3 16 0 0 0 -0.9239 0 -0.3827 -0.7071 0 -0.7071
  [3,16,0,0,0,-0.9239,0,-0.3827,-0.7071,0,-0.7071],
// 3 16 0 0 0 -0.7071 0 -0.7071 -0.3827 0 -0.9239
  [3,16,0,0,0,-0.7071,0,-0.7071,-0.3827,0,-0.9239],
// 3 16 0 0 0 -0.3827 0 -0.9239 0 0 -1
  [3,16,0,0,0,-0.3827,0,-0.9239,0,0,-1],
// 3 16 0 0 0 0 0 -1 0.3827 0 -0.9239
  [3,16,0,0,0,0,0,-1,0.3827,0,-0.9239],
// 3 16 0 0 0 0.3827 0 -0.9239 0.7071 0 -0.7071
  [3,16,0,0,0,0.3827,0,-0.9239,0.7071,0,-0.7071],
// 3 16 0 0 0 0.7071 0 -0.7071 0.9239 0 -0.3827
  [3,16,0,0,0,0.7071,0,-0.7071,0.9239,0,-0.3827],
// 3 16 0 0 0 0.9239 0 -0.3827 1 0 0
  [3,16,0,0,0,0.9239,0,-0.3827,1,0,0],
// 0
];
module ldraw_lib__4_4disc(step=0, col=false, unit=2/5, alt=false, line=0.2, solid=!$preview)
    makepoly(ldraw_lib__4_4disc(), step=step, col=col, unit=unit, alt=alt, line=line, solid=solid);
ldraw_lib__4_4disc(line=0.2);
// file: 98138.scad
use <../lib.scad>
use <../p/4-4disc.scad>
use <s/98138s01.scad>
function ldraw_lib__98138() = [
// 0 Tile  1 x  1 Round with Groove
// 0 Name: 98138.dat
// 0 Author: Magnus Forsberg [MagFors]
// 0 !LDRAW_ORG Part UPDATE 2011-02
// 0 !LICENSE Licensed under CC BY 4.0 : see CAreadme.txt
// 
// 0 BFC CERTIFY CCW
  [0,"BFC","CERTIFY"],
  [0,"BFC","CCW"],
// 
// 0 !HISTORY 2011-12-29 [PTadmin] Official Update 2011-02
// 
// 
// 1 16 0 0 0 1 0 0 0 1 0 0 0 1 s\98138s01.dat
  [1,16,0,0,0,1,0,0,0,1,0,0,0,1, ldraw_lib__s__98138s01()],
// 1 16 0 0 0 9 0 0 0 1 0 0 0 9 4-4disc.dat
  [1,16,0,0,0,9,0,0,0,1,0,0,0,9, ldraw_lib__4_4disc()],
// 
];
module ldraw_lib__98138(step=0, col=false, unit=2/5, alt=false, line=0.2, solid=!$preview)
    makepoly(ldraw_lib__98138(), step=step, col=col, unit=unit, alt=alt, line=line, solid=solid);
ldraw_lib__98138(line=0.2);
// main file
use <../lib.scad>
use <98138.scad>
function ldraw_lib__35381() = [
// 0 =Tile  1 x  1 Round with Groove
// 0 Name: 35381.dat
// 0 Author: Massimo Maso [Sirio]
// 0 !LDRAW_ORG Part Alias UPDATE 2025-05
// 0 !LICENSE Licensed under CC BY 4.0 : see CAreadme.txt
// 
// 0 BFC CERTIFY CCW
  [0,"BFC","CERTIFY"],
  [0,"BFC","CCW"],
// 
// 0 !KEYWORDS BrickLink 98138, Rebrickable 98138
// 
// 0 !HISTORY 2025-05-28 [OrionP] Official Update 2025-05
// 
// 1 16 0 0 0 1 0 0 0 1 0 0 0 1 98138.dat
  [1,16,0,0,0,1,0,0,0,1,0,0,0,1, ldraw_lib__98138()],
];
module ldraw_lib__35381(step=0, col=false, unit=2/5, alt=false, line=0.2, solid=!$preview)
    makepoly(ldraw_lib__35381(), step=step, col=col, unit=unit, alt=alt, line=line, solid=solid);
ldraw_lib__35381(line=0.2);
